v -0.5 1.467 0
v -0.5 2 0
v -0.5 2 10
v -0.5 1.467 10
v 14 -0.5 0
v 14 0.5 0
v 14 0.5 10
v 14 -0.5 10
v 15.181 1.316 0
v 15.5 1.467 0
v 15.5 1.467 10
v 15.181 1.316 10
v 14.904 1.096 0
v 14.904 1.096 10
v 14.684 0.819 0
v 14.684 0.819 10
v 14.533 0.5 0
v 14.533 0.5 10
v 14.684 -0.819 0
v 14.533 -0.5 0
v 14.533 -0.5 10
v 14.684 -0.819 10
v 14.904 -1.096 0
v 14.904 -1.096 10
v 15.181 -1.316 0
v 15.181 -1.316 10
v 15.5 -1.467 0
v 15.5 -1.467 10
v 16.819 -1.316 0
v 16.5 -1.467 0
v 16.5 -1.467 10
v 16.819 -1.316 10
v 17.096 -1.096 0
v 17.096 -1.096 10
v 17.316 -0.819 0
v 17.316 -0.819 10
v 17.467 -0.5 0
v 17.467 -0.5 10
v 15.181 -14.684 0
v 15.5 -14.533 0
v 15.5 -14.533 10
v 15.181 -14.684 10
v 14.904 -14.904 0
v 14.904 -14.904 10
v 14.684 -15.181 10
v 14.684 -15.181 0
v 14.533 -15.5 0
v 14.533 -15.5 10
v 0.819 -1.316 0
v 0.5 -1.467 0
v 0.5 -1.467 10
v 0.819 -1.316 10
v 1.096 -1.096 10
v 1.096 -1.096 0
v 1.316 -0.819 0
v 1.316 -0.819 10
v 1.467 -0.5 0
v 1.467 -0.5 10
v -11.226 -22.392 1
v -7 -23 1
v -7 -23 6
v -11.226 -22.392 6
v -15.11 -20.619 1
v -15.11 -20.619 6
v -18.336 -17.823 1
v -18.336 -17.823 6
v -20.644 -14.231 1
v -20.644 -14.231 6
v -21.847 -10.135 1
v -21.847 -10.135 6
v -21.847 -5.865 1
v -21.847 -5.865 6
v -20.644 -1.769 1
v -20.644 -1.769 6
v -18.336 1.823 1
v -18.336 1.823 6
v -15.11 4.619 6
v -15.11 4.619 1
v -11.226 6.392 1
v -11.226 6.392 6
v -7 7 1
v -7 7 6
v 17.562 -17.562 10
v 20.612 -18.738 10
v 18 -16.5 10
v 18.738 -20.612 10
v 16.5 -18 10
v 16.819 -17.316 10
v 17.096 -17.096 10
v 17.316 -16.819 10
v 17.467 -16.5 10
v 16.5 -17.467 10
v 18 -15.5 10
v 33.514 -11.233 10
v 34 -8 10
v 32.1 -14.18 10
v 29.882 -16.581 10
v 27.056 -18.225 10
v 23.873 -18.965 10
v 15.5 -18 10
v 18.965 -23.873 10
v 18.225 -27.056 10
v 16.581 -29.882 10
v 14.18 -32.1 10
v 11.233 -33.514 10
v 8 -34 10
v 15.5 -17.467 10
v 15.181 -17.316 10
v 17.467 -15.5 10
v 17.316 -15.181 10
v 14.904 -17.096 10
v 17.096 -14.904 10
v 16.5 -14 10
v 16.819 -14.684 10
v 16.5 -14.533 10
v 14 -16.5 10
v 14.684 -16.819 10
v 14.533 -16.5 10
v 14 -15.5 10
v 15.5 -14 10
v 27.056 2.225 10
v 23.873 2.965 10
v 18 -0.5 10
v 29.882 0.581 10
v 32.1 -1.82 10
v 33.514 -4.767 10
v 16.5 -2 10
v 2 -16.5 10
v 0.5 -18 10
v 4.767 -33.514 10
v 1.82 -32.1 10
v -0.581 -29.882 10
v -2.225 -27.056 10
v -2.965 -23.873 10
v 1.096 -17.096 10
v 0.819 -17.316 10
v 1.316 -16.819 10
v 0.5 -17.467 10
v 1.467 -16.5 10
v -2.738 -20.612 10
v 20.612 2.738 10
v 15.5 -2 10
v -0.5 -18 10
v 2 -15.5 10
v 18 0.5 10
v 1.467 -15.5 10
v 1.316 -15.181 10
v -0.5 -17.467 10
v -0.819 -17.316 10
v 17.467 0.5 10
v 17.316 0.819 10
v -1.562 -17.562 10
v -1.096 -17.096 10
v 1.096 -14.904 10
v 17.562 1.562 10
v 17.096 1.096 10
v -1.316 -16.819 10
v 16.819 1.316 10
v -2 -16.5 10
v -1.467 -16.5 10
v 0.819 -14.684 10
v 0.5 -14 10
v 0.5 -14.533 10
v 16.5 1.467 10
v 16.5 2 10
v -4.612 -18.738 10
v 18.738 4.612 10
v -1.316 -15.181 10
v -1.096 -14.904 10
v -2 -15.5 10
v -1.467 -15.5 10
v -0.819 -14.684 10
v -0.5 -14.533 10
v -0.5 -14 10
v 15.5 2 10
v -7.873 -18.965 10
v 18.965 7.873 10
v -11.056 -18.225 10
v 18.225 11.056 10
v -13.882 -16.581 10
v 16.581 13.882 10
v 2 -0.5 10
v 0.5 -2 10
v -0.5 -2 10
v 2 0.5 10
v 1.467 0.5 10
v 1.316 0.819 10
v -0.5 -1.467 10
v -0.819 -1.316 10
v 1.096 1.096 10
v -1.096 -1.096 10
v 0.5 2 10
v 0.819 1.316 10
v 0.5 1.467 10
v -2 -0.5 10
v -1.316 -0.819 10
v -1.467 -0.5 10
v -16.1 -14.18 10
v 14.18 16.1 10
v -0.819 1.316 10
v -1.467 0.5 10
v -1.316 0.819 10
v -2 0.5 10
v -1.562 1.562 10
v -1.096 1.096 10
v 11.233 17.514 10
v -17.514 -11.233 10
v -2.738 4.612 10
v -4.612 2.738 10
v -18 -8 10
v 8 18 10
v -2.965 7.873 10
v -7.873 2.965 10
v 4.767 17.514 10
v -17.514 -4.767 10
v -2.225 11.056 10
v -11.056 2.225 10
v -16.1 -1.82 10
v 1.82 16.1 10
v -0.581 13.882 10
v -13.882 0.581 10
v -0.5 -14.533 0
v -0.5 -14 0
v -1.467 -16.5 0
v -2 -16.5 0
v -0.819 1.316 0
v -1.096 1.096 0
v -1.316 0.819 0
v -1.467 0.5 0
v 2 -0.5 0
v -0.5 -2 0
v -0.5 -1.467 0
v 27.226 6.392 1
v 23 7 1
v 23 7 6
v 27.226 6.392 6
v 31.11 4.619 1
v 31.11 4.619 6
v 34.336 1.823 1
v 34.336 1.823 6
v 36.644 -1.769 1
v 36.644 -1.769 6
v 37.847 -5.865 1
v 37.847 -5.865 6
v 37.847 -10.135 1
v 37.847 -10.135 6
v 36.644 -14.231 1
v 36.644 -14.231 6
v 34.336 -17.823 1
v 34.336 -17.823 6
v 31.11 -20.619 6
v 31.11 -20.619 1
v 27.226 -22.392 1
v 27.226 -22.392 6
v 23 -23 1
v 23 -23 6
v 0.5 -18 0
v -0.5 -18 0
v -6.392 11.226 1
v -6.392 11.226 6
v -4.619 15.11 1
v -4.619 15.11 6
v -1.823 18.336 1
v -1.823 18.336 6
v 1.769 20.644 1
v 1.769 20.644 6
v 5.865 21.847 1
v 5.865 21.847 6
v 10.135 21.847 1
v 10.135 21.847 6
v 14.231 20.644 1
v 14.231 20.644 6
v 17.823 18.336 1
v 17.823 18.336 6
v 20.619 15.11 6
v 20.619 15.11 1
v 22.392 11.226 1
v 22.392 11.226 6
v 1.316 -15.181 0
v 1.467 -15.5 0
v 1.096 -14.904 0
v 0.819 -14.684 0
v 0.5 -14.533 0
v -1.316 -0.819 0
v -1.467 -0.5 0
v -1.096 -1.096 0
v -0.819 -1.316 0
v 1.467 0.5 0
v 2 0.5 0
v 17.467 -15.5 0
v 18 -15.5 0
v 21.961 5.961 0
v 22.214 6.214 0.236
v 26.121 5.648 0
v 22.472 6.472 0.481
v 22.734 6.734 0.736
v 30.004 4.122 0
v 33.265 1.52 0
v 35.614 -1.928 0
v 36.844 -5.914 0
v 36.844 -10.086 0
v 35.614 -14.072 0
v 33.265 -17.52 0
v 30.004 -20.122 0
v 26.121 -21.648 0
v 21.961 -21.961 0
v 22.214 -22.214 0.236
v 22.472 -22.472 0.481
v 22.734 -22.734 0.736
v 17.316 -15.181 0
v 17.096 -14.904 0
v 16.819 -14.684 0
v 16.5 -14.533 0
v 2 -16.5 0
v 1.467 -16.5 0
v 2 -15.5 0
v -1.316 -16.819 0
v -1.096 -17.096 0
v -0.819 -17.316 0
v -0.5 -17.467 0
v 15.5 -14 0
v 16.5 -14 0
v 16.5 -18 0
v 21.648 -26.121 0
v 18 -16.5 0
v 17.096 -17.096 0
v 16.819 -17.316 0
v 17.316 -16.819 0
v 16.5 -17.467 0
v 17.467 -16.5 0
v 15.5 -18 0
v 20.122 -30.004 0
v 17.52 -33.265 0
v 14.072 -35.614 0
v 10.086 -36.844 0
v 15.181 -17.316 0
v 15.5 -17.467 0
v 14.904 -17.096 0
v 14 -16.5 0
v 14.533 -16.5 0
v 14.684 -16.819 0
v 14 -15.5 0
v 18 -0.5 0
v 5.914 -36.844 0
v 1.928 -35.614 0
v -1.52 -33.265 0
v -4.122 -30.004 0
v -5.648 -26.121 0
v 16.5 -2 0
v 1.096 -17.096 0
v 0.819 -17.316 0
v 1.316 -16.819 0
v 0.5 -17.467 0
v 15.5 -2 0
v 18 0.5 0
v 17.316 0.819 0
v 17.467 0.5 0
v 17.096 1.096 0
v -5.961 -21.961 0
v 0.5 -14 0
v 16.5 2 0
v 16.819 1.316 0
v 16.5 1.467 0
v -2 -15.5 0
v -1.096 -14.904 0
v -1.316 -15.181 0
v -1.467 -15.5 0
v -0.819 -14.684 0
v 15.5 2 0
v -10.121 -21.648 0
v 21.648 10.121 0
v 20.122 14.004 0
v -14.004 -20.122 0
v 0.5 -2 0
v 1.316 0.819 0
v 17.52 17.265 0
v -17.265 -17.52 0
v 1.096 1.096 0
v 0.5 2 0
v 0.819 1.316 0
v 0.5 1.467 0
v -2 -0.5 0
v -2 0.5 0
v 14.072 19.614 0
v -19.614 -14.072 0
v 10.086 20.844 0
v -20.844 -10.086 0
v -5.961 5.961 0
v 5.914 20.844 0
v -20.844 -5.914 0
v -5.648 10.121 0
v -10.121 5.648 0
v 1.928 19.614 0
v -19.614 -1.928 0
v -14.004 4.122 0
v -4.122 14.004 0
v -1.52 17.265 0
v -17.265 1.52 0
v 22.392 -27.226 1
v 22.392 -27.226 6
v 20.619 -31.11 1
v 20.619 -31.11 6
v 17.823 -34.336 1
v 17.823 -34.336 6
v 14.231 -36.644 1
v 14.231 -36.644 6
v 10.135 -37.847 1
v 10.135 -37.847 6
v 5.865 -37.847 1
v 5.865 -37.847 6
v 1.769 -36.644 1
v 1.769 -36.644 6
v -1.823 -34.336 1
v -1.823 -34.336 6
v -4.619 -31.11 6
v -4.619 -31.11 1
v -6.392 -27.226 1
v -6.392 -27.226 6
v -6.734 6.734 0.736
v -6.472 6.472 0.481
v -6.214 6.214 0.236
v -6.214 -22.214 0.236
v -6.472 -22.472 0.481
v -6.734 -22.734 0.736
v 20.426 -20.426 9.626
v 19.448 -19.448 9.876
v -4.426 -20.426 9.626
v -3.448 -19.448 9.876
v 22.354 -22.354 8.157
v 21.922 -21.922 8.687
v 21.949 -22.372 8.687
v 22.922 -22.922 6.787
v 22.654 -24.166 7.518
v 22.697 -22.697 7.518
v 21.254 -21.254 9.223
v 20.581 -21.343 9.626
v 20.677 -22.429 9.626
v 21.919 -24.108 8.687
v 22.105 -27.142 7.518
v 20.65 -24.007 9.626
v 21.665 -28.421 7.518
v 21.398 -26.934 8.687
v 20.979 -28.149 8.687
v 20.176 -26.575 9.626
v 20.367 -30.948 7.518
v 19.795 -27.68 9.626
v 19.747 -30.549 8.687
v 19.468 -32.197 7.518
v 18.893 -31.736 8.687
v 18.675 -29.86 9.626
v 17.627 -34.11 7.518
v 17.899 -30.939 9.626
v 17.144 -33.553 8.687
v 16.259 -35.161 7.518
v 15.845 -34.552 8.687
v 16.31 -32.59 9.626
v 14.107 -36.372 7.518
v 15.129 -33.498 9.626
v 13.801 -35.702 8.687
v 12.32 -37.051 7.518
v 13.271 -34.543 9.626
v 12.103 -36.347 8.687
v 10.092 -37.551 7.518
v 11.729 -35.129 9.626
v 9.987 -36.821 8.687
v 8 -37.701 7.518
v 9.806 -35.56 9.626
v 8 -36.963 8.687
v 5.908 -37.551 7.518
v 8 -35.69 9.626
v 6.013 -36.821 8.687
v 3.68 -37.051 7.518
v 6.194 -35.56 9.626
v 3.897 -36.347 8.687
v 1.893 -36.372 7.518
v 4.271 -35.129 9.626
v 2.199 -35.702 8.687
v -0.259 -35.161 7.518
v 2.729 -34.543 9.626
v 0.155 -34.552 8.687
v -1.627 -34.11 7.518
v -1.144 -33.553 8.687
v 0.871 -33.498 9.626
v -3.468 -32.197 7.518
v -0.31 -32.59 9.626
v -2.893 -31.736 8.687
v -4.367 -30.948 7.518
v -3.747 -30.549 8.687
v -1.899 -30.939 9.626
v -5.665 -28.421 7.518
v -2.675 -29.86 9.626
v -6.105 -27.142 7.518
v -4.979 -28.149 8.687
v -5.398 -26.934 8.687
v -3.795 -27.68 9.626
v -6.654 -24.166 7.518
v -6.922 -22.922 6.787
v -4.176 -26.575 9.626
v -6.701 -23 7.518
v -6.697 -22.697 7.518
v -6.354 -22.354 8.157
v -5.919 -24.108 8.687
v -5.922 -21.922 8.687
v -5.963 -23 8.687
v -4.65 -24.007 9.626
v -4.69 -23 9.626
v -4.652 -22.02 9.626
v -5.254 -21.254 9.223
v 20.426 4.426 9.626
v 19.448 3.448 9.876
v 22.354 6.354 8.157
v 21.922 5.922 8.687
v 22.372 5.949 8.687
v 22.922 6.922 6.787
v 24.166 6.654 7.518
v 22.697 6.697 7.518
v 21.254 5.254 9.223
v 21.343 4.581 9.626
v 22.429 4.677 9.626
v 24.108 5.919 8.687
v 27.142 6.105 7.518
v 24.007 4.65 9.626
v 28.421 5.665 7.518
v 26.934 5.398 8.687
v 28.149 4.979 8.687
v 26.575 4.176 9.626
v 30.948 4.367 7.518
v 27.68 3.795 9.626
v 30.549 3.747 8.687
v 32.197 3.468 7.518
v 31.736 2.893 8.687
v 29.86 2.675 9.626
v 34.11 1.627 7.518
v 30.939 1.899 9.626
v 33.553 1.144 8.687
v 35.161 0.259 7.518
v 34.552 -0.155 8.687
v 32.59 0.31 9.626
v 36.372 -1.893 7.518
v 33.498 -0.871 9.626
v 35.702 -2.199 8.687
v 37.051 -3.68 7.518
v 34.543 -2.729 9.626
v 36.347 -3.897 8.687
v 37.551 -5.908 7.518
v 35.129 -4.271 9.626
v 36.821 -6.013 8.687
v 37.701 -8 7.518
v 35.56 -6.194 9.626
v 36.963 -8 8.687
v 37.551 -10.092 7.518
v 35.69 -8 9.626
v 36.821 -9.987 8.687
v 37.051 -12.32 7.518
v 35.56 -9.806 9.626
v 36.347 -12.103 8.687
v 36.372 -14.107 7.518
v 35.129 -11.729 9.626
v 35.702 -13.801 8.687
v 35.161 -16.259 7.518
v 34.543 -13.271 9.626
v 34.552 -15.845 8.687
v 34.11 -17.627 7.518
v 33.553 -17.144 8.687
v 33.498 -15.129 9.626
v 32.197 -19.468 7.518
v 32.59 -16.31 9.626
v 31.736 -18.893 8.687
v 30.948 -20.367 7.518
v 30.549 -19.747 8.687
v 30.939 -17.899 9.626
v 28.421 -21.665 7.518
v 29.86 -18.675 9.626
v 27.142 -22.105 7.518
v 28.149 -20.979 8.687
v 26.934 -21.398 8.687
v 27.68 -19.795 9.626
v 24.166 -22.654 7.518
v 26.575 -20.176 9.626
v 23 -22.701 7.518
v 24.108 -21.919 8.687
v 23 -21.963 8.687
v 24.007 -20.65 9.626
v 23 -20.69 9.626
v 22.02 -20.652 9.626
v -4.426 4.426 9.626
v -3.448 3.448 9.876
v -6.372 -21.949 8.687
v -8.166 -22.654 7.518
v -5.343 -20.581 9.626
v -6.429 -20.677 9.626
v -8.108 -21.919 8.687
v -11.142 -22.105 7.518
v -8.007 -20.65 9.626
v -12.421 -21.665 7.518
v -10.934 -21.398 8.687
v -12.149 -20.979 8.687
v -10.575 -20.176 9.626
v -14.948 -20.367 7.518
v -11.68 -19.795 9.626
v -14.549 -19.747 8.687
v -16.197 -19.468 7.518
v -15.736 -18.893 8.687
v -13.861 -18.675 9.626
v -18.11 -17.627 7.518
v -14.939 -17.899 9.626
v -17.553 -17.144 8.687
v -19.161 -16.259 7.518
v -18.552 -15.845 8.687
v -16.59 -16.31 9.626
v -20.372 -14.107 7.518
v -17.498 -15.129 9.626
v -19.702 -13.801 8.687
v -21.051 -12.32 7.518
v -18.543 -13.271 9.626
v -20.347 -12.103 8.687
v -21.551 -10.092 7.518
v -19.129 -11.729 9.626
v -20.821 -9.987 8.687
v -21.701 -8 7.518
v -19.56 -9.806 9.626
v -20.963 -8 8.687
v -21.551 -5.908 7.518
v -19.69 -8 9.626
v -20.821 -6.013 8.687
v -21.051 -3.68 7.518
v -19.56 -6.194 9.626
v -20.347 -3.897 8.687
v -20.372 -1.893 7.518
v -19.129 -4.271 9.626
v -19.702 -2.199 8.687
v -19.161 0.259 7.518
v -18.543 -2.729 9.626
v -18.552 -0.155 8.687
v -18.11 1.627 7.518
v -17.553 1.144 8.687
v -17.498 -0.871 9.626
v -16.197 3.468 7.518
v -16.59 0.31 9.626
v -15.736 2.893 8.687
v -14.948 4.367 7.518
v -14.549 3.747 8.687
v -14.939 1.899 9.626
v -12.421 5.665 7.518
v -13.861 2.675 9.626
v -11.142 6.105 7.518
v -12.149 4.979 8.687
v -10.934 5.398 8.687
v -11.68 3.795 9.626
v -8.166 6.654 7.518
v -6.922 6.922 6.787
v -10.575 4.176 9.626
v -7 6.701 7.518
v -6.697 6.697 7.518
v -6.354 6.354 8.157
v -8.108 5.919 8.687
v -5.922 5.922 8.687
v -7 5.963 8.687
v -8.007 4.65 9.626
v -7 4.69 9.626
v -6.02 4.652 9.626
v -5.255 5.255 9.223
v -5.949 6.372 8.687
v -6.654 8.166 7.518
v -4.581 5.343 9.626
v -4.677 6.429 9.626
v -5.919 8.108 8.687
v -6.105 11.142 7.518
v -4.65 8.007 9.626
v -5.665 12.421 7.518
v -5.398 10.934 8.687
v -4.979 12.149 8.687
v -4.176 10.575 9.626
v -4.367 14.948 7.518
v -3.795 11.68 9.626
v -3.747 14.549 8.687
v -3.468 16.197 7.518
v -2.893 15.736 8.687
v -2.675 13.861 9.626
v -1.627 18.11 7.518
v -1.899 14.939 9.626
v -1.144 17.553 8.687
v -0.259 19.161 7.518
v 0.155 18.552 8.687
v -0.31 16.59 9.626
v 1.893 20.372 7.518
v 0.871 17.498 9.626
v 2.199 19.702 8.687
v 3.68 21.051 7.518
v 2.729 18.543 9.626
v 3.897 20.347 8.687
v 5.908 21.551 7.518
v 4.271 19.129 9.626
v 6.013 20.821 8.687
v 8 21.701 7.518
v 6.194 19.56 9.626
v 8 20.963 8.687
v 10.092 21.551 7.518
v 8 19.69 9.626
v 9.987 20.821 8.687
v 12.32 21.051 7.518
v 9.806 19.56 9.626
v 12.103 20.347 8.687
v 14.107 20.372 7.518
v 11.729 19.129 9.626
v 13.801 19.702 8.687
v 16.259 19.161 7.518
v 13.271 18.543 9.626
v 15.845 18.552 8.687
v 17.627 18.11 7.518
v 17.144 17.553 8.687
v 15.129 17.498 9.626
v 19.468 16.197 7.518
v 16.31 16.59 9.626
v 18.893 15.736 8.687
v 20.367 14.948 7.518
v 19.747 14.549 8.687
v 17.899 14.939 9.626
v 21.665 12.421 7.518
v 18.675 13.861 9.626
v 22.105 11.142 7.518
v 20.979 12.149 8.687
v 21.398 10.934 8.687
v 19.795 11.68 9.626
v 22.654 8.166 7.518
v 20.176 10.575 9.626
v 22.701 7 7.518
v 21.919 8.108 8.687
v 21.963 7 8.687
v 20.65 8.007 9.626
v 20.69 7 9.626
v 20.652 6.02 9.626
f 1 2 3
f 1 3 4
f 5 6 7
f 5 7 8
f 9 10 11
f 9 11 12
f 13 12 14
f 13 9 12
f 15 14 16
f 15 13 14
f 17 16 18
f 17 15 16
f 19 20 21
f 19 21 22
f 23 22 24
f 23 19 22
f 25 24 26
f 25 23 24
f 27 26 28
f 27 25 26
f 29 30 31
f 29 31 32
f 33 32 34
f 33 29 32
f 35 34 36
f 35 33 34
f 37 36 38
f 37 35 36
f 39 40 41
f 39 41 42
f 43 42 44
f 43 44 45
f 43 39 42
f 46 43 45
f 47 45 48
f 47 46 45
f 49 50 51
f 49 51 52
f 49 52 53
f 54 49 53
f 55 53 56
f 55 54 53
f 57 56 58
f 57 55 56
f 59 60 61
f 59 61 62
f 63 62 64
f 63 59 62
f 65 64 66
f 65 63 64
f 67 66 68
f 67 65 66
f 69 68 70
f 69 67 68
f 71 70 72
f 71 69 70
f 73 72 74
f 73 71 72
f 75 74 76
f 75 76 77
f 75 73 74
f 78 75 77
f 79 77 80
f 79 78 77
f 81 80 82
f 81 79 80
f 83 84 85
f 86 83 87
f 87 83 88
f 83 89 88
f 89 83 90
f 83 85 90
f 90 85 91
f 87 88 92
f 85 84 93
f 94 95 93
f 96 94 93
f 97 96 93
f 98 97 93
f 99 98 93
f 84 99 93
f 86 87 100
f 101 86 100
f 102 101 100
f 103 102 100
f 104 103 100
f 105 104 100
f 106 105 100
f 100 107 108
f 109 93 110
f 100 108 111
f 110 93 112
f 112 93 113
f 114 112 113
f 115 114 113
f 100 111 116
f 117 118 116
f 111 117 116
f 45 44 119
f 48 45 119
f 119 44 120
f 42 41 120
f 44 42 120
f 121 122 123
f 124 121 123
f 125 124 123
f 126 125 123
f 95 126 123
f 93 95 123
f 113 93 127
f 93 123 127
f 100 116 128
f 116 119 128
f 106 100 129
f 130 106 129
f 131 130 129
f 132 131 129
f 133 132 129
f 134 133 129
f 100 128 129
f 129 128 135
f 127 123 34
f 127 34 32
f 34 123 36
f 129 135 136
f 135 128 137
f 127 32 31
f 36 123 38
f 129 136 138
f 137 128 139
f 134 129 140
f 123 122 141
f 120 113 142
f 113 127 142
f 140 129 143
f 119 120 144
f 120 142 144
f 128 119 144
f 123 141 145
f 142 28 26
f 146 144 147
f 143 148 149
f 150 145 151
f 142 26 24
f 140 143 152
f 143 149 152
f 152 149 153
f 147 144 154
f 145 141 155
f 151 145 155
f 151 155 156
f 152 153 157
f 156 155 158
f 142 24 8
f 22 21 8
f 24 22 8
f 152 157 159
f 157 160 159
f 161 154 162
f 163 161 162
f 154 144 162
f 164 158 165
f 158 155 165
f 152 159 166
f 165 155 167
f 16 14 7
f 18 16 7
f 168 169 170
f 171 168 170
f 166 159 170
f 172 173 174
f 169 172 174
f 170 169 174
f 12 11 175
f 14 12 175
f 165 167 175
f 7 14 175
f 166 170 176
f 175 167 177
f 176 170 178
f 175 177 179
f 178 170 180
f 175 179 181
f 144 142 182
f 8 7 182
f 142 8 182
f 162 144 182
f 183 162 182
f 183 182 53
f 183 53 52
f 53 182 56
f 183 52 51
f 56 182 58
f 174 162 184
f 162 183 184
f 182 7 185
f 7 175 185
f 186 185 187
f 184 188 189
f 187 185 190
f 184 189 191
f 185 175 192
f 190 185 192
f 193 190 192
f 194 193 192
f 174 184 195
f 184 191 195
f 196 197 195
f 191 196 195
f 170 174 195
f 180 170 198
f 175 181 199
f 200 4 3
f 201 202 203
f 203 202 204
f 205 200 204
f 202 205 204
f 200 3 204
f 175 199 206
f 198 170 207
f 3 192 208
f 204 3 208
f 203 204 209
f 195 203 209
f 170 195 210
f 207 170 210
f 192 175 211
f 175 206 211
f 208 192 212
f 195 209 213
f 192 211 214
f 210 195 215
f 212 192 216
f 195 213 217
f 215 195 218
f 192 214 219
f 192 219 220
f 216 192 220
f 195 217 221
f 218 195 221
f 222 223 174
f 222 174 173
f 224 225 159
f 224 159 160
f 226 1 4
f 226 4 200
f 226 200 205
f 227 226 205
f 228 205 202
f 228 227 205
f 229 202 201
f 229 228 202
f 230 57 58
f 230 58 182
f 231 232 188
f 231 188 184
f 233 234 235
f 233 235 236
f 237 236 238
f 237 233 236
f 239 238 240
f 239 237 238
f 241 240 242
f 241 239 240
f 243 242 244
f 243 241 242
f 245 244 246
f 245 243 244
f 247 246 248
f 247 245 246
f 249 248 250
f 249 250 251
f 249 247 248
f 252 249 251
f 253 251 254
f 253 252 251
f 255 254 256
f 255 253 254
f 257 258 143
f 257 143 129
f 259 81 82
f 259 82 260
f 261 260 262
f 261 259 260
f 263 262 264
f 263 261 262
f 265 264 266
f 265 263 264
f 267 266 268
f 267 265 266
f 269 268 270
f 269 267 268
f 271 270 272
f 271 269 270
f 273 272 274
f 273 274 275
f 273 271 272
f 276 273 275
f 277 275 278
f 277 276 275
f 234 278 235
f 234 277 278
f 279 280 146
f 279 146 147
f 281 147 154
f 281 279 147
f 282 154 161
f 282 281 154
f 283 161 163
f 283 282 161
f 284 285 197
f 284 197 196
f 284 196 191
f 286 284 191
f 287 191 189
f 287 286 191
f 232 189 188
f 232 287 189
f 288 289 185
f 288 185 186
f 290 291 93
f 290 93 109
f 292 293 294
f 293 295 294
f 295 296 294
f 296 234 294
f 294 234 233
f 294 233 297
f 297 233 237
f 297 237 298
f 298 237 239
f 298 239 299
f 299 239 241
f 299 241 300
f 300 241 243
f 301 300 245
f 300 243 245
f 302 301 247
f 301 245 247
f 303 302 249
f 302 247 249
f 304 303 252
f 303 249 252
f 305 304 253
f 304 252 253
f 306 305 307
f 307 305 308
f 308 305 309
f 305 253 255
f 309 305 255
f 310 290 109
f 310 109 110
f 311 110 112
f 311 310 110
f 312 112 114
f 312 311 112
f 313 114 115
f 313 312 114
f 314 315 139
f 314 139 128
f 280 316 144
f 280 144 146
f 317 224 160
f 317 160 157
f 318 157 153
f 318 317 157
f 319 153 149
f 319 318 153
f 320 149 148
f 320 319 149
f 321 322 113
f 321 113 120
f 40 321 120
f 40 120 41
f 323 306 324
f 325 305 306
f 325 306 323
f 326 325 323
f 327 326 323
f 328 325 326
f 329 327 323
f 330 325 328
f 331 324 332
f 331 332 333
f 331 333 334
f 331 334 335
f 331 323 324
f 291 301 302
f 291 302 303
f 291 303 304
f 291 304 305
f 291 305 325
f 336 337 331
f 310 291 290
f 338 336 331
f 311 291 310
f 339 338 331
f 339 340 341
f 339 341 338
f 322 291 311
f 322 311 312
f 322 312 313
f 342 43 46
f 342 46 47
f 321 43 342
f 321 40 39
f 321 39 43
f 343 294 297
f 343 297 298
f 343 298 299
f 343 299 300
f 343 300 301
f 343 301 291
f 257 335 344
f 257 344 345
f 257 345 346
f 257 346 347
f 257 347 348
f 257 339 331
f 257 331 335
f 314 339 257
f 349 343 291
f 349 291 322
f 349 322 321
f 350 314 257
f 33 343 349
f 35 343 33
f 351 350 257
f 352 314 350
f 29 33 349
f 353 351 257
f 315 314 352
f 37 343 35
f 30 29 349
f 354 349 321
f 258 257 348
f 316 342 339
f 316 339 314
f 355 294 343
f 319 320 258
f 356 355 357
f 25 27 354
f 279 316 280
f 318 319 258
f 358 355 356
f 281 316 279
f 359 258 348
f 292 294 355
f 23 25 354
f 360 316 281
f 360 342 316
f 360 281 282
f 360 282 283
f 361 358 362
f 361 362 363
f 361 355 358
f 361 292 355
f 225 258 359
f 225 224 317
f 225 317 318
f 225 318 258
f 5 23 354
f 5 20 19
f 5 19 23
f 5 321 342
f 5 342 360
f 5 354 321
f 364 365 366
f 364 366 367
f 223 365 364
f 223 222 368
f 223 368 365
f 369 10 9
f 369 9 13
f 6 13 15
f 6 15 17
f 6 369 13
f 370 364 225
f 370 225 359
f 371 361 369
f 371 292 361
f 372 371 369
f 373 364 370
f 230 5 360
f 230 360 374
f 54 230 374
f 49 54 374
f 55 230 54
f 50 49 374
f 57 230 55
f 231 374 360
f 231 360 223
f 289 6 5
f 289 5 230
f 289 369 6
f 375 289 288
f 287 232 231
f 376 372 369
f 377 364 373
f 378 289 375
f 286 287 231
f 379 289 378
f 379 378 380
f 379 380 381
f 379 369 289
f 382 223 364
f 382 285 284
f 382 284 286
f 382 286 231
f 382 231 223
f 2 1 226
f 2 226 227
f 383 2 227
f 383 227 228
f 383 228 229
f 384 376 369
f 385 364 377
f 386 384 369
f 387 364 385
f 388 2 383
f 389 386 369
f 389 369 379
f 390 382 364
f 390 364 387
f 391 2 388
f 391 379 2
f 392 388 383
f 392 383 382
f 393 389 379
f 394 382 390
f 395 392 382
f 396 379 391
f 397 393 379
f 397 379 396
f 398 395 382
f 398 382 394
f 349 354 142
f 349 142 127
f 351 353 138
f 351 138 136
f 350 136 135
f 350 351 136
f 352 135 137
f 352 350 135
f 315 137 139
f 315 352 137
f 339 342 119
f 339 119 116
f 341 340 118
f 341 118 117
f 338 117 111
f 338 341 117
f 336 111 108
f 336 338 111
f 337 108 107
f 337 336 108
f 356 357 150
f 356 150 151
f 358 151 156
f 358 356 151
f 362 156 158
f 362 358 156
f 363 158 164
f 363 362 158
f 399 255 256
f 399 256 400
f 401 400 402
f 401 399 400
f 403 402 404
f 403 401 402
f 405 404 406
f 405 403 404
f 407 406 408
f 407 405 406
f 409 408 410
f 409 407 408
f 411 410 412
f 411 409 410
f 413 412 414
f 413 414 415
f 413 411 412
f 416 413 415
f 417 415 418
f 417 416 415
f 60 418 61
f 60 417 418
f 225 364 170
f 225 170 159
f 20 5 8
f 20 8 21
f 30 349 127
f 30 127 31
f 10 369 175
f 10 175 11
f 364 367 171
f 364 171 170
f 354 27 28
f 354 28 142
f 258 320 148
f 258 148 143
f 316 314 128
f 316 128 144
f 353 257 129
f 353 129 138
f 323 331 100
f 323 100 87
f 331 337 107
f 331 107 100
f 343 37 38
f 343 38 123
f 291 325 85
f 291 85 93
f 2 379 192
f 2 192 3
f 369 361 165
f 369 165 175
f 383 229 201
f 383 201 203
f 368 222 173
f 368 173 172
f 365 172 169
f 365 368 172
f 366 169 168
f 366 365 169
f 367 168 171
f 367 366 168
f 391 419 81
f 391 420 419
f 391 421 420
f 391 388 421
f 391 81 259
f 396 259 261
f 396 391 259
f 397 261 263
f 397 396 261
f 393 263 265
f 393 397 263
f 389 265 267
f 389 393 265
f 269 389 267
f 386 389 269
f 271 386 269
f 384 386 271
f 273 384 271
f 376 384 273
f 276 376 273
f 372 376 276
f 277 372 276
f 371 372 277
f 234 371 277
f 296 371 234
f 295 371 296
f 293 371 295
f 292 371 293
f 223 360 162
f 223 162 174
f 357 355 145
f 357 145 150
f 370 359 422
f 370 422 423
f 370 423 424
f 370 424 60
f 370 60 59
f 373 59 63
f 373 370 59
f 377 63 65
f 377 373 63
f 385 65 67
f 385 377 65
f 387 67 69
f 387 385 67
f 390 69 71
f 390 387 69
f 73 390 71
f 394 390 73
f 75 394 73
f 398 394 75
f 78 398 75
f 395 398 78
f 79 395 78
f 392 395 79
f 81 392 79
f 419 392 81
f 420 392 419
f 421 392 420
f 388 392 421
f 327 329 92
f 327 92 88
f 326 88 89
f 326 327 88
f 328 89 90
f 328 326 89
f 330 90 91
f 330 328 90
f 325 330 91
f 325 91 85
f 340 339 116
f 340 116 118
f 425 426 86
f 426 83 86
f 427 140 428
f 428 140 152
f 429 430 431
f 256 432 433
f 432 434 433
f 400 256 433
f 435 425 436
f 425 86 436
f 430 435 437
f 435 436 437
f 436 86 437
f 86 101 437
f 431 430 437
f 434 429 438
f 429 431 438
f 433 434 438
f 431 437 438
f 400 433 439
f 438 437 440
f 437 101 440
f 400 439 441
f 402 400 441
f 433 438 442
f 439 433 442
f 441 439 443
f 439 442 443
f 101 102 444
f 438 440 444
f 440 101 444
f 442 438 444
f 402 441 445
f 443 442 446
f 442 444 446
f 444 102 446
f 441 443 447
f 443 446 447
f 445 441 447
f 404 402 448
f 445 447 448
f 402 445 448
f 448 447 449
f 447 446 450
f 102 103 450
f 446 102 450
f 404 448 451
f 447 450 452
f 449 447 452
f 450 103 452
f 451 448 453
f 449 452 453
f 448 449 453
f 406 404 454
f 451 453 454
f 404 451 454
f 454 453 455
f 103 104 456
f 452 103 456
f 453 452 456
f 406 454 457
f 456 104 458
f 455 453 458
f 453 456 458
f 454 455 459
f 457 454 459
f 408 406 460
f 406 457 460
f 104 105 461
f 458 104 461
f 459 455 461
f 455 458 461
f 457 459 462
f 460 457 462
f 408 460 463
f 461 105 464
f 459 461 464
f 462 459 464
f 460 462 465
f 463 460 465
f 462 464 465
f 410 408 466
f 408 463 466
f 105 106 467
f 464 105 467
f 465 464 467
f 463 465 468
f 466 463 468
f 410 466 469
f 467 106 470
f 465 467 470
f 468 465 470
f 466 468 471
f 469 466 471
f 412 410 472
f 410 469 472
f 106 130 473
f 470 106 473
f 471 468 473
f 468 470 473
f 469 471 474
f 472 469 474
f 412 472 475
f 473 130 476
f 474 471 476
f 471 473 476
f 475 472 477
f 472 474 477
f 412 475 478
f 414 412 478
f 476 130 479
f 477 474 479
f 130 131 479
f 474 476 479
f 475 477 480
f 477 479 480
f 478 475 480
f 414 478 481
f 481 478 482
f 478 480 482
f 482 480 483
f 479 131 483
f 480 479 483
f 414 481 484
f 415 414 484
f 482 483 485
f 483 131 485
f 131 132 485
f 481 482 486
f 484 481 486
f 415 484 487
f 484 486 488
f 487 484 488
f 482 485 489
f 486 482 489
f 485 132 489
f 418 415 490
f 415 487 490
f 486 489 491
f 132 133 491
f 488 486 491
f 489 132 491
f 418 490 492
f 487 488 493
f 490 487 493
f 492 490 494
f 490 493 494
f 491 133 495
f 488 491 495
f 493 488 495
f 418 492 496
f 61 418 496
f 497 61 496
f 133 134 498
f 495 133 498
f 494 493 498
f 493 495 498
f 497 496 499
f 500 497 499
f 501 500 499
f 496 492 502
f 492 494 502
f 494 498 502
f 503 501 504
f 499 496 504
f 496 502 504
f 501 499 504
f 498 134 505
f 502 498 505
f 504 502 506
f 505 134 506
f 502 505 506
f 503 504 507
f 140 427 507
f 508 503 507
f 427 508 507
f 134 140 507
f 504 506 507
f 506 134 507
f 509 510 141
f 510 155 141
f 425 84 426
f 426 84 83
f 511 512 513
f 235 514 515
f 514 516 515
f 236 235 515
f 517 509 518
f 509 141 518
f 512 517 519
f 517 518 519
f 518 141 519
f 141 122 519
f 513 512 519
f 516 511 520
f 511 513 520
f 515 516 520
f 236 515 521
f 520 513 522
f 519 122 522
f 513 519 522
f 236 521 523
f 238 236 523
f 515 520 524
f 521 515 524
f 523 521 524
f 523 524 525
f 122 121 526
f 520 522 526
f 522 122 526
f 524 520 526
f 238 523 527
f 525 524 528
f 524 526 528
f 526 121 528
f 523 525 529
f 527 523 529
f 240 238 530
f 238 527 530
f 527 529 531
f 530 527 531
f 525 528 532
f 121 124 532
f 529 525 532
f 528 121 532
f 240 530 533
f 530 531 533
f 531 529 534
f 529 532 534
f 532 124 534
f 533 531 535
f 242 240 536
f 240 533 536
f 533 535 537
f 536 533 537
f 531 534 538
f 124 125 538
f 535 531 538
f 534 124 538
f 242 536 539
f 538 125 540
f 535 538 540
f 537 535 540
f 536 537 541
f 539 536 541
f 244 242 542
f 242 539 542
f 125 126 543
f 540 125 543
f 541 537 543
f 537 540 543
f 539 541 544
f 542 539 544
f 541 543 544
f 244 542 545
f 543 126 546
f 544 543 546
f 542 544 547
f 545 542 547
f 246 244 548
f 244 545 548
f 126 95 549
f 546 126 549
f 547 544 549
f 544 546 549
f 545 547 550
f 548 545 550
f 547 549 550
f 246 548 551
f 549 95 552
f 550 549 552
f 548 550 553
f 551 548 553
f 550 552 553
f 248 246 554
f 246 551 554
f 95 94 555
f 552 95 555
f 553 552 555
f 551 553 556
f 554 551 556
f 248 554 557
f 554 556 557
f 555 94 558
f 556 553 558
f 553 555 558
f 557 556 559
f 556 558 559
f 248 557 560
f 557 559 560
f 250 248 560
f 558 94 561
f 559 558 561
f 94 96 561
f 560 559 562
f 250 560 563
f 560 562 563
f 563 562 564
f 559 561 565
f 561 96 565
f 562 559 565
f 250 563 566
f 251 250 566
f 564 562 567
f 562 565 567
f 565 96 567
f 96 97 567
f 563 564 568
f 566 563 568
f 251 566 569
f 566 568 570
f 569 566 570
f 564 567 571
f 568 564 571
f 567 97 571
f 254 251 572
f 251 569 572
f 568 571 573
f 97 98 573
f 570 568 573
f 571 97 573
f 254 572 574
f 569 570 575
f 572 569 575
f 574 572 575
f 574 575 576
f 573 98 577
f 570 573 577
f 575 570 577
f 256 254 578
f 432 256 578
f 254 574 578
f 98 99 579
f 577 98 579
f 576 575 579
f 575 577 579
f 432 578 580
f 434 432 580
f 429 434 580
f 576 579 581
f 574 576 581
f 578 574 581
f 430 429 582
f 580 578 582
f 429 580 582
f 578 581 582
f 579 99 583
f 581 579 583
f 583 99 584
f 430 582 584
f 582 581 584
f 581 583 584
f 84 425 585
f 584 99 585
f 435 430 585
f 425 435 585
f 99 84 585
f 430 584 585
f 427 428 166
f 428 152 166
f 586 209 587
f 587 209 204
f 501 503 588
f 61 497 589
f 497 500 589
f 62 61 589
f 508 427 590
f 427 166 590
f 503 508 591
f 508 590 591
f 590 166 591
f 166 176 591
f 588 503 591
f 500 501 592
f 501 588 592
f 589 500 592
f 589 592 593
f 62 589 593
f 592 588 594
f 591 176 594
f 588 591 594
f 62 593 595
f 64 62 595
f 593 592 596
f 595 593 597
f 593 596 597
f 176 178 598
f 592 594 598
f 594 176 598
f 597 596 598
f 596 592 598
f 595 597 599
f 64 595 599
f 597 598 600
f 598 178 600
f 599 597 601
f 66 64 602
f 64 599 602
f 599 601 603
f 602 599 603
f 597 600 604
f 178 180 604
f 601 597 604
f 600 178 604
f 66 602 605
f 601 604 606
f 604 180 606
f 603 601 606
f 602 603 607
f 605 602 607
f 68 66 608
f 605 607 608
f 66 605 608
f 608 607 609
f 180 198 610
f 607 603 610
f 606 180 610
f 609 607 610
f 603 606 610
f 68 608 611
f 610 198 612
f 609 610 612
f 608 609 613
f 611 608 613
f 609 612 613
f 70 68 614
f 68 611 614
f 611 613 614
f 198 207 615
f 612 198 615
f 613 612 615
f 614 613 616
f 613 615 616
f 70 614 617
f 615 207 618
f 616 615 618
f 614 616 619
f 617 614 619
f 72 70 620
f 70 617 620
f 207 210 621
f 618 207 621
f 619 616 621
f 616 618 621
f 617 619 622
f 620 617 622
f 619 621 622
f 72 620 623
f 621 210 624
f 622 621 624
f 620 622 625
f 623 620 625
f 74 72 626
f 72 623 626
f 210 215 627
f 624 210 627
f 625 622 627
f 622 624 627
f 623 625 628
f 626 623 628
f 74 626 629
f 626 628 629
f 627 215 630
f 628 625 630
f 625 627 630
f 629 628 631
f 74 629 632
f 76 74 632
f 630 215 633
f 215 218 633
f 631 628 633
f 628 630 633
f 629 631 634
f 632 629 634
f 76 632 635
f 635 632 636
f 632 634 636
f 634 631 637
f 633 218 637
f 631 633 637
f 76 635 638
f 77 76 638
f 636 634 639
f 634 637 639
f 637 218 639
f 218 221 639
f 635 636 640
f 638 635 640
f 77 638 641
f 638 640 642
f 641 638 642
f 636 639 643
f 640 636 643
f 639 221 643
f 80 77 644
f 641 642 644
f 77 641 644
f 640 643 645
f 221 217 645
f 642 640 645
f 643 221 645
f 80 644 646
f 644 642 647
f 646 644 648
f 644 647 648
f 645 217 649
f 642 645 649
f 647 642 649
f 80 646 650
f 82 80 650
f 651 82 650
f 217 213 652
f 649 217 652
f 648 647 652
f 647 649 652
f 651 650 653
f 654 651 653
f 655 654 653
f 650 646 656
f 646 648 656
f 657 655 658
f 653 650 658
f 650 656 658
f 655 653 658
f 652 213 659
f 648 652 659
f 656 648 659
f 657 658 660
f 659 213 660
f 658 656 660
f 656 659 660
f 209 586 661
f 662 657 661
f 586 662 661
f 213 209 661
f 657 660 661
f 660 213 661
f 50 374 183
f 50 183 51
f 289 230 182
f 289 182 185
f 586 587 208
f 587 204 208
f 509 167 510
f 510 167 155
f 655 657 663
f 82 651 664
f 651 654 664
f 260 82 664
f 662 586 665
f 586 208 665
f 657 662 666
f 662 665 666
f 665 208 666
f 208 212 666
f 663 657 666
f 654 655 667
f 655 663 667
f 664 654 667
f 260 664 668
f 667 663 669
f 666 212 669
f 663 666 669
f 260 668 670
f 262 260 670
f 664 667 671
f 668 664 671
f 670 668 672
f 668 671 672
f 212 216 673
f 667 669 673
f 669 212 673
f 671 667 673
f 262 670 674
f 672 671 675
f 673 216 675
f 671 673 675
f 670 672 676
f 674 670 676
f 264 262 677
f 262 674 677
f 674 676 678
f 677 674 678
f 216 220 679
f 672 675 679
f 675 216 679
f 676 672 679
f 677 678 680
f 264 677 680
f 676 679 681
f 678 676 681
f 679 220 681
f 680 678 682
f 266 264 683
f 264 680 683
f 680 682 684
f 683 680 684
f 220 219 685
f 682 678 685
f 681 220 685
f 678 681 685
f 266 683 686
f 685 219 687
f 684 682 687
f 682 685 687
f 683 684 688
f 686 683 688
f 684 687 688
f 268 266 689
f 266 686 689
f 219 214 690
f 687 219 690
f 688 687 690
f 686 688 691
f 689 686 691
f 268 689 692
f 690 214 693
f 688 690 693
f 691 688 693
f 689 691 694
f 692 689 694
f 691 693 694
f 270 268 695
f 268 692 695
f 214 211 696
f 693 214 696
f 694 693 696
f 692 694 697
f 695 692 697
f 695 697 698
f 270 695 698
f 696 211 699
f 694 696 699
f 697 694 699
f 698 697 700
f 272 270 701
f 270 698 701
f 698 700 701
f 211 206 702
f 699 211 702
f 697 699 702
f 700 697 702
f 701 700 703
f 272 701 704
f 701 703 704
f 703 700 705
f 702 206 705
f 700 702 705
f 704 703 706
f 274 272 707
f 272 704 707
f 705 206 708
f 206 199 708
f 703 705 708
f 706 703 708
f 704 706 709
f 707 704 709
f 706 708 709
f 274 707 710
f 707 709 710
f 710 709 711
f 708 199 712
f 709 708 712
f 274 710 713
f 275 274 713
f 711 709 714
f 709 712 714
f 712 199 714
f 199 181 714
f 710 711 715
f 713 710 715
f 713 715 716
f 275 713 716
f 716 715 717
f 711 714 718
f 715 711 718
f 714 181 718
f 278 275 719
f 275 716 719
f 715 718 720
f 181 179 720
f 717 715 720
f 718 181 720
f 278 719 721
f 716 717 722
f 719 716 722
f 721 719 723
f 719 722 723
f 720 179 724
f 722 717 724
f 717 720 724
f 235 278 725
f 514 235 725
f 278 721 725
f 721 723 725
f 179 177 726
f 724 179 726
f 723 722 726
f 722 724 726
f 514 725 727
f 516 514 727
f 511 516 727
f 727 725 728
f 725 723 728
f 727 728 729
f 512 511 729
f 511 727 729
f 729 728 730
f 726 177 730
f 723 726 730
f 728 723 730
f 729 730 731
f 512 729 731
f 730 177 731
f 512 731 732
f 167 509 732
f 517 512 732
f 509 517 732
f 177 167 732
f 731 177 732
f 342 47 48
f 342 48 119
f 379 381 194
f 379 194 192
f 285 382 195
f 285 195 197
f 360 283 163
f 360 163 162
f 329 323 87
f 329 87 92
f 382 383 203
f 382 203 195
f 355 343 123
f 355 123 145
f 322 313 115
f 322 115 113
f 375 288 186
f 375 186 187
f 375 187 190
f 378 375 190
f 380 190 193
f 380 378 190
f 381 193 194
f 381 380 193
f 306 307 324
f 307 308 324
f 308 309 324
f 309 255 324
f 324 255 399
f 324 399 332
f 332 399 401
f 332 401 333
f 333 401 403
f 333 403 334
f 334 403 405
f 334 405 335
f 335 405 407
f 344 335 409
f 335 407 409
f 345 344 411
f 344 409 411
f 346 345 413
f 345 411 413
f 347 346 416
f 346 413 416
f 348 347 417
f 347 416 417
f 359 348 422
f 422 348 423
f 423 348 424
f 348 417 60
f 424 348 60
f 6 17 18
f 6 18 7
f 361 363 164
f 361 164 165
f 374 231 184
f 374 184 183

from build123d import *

# Parameters (mm, degrees)
BOSS_EXTRUDE1_DEPTH = 10
FILLET1_R           = 4
CHAMFER1_SIZE       = 1


with BuildPart() as part:
    # Sketch1 → Boss-Extrude1 (new body)
    with BuildSketch(Plane.XY):
        with BuildLine():
            ThreePointArc((-7, 7), (8, 22), (23, 7))
            ThreePointArc((23, 7), (38, -8), (23, -23))
            ThreePointArc((23, -23), (8, -38), (-7, -23))
            ThreePointArc((-7, -23), (-22, -8), (-7, 7))
        make_face()
        with BuildLine():
            Line((-0.5, -2), (0.5, -2))
            Line((0.5, -2), (0.5, -1.467140075))
            ThreePointArc((0.5, -1.467140075), (1.096015511, -1.096015511), (1.467140075, -0.5))
            Line((1.467140075, -0.5), (2, -0.5))
            Line((2, -0.5), (2, 0.5))
            Line((2, 0.5), (1.467140075, 0.5))
            ThreePointArc((1.467140075, 0.5), (1.096015511, 1.096015511), (0.5, 1.467140075))
            Line((0.5, 1.467140075), (0.5, 2))
            Line((0.5, 2), (-0.5, 2))
            Line((-0.5, 2), (-0.5, 1.467140075))
            ThreePointArc((-0.5, 1.467140075), (-1.096015511, 1.096015511), (-1.467140075, 0.5))
            Line((-1.467140075, 0.5), (-2, 0.5))
            Line((-2, 0.5), (-2, -0.5))
            Line((-2, -0.5), (-1.467140075, -0.5))
            ThreePointArc((-1.467140075, -0.5), (-1.096015511, -1.096015511), (-0.5, -1.467140075))
            Line((-0.5, -1.467140075), (-0.5, -2))
        make_face(mode=Mode.SUBTRACT)
        with BuildLine():
            Line((18, -0.5), (18, 0.5))
            Line((18, 0.5), (17.467140075, 0.5))
            ThreePointArc((17.467140075, 0.5), (17.096015511, 1.096015511), (16.5, 1.467140075))
            Line((16.5, 1.467140075), (16.5, 2))
            Line((16.5, 2), (15.5, 2))
            Line((15.5, 2), (15.5, 1.467140075))
            ThreePointArc((15.5, 1.467140075), (14.903984489, 1.096015511), (14.532859925, 0.5))
            Line((14.532859925, 0.5), (14, 0.5))
            Line((14, 0.5), (14, -0.5))
            Line((14, -0.5), (14.532859925, -0.5))
            ThreePointArc((14.532859925, -0.5), (14.903984489, -1.096015511), (15.5, -1.467140075))
            Line((15.5, -1.467140075), (15.5, -2))
            Line((15.5, -2), (16.5, -2))
            Line((16.5, -2), (16.5, -1.467140075))
            ThreePointArc((16.5, -1.467140075), (17.096015511, -1.096015511), (17.467140075, -0.5))
            Line((17.467140075, -0.5), (18, -0.5))
        make_face(mode=Mode.SUBTRACT)
        with BuildLine():
            Line((18, -15.5), (17.467140075, -15.5))
            ThreePointArc((17.467140075, -15.5), (17.096015511, -14.903984489), (16.5, -14.532859925))
            Line((16.5, -14.532859925), (16.5, -14))
            Line((16.5, -14), (15.5, -14))
            Line((15.5, -14), (15.5, -14.532859925))
            ThreePointArc((15.5, -14.532859925), (14.903984489, -14.903984489), (14.532859925, -15.5))
            Line((14.532859925, -15.5), (14, -15.5))
            Line((14, -15.5), (14, -16.5))
            Line((14, -16.5), (14.532859925, -16.5))
            ThreePointArc((14.532859925, -16.5), (14.903984489, -17.096015511), (15.5, -17.467140075))
            Line((15.5, -17.467140075), (15.5, -18))
            Line((15.5, -18), (16.5, -18))
            Line((16.5, -18), (16.5, -17.467140075))
            ThreePointArc((16.5, -17.467140075), (17.096015511, -17.096015511), (17.467140075, -16.5))
            Line((17.467140075, -16.5), (18, -16.5))
            Line((18, -16.5), (18, -15.5))
        make_face(mode=Mode.SUBTRACT)
        with BuildLine():
            Line((-2, -15.5), (-2, -16.5))
            Line((-2, -16.5), (-1.467140075, -16.5))
            ThreePointArc((-1.467140075, -16.5), (-1.096015511, -17.096015511), (-0.5, -17.467140075))
            Line((-0.5, -17.467140075), (-0.5, -18))
            Line((-0.5, -18), (0.5, -18))
            Line((0.5, -18), (0.5, -17.467140075))
            ThreePointArc((0.5, -17.467140075), (1.096015511, -17.096015511), (1.467140075, -16.5))
            Line((1.467140075, -16.5), (2, -16.5))
            Line((2, -16.5), (2, -15.5))
            Line((2, -15.5), (1.467140075, -15.5))
            ThreePointArc((1.467140075, -15.5), (1.096015511, -14.903984489), (0.5, -14.532859925))
            Line((0.5, -14.532859925), (0.5, -14))
            Line((0.5, -14), (-0.5, -14))
            Line((-0.5, -14), (-0.5, -14.532859925))
            ThreePointArc((-0.5, -14.532859925), (-1.096015511, -14.903984489), (-1.467140075, -15.5))
            Line((-1.467140075, -15.5), (-2, -15.5))
        make_face(mode=Mode.SUBTRACT)
    extrude(amount=BOSS_EXTRUDE1_DEPTH)

    # Fillet1
    fillet1_edges = [part.edges().sort_by_distance(p)[0] for p in [
        (-22, -8, 10),
        (8, -38, 10),
        (38, -8, 10),
        (8, 22, 10),
    ]]
    fillet(fillet1_edges, radius=FILLET1_R)

    # Chamfer1
    chamfer1_edges = [part.edges().sort_by_distance(p)[0] for p in [
        (38, -8, 0),
        (8, -38, 0),
        (-22, -8, 0),
        (8, 22, 0),
    ]]
    chamfer(chamfer1_edges, length=CHAMFER1_SIZE)


solid = part.part
